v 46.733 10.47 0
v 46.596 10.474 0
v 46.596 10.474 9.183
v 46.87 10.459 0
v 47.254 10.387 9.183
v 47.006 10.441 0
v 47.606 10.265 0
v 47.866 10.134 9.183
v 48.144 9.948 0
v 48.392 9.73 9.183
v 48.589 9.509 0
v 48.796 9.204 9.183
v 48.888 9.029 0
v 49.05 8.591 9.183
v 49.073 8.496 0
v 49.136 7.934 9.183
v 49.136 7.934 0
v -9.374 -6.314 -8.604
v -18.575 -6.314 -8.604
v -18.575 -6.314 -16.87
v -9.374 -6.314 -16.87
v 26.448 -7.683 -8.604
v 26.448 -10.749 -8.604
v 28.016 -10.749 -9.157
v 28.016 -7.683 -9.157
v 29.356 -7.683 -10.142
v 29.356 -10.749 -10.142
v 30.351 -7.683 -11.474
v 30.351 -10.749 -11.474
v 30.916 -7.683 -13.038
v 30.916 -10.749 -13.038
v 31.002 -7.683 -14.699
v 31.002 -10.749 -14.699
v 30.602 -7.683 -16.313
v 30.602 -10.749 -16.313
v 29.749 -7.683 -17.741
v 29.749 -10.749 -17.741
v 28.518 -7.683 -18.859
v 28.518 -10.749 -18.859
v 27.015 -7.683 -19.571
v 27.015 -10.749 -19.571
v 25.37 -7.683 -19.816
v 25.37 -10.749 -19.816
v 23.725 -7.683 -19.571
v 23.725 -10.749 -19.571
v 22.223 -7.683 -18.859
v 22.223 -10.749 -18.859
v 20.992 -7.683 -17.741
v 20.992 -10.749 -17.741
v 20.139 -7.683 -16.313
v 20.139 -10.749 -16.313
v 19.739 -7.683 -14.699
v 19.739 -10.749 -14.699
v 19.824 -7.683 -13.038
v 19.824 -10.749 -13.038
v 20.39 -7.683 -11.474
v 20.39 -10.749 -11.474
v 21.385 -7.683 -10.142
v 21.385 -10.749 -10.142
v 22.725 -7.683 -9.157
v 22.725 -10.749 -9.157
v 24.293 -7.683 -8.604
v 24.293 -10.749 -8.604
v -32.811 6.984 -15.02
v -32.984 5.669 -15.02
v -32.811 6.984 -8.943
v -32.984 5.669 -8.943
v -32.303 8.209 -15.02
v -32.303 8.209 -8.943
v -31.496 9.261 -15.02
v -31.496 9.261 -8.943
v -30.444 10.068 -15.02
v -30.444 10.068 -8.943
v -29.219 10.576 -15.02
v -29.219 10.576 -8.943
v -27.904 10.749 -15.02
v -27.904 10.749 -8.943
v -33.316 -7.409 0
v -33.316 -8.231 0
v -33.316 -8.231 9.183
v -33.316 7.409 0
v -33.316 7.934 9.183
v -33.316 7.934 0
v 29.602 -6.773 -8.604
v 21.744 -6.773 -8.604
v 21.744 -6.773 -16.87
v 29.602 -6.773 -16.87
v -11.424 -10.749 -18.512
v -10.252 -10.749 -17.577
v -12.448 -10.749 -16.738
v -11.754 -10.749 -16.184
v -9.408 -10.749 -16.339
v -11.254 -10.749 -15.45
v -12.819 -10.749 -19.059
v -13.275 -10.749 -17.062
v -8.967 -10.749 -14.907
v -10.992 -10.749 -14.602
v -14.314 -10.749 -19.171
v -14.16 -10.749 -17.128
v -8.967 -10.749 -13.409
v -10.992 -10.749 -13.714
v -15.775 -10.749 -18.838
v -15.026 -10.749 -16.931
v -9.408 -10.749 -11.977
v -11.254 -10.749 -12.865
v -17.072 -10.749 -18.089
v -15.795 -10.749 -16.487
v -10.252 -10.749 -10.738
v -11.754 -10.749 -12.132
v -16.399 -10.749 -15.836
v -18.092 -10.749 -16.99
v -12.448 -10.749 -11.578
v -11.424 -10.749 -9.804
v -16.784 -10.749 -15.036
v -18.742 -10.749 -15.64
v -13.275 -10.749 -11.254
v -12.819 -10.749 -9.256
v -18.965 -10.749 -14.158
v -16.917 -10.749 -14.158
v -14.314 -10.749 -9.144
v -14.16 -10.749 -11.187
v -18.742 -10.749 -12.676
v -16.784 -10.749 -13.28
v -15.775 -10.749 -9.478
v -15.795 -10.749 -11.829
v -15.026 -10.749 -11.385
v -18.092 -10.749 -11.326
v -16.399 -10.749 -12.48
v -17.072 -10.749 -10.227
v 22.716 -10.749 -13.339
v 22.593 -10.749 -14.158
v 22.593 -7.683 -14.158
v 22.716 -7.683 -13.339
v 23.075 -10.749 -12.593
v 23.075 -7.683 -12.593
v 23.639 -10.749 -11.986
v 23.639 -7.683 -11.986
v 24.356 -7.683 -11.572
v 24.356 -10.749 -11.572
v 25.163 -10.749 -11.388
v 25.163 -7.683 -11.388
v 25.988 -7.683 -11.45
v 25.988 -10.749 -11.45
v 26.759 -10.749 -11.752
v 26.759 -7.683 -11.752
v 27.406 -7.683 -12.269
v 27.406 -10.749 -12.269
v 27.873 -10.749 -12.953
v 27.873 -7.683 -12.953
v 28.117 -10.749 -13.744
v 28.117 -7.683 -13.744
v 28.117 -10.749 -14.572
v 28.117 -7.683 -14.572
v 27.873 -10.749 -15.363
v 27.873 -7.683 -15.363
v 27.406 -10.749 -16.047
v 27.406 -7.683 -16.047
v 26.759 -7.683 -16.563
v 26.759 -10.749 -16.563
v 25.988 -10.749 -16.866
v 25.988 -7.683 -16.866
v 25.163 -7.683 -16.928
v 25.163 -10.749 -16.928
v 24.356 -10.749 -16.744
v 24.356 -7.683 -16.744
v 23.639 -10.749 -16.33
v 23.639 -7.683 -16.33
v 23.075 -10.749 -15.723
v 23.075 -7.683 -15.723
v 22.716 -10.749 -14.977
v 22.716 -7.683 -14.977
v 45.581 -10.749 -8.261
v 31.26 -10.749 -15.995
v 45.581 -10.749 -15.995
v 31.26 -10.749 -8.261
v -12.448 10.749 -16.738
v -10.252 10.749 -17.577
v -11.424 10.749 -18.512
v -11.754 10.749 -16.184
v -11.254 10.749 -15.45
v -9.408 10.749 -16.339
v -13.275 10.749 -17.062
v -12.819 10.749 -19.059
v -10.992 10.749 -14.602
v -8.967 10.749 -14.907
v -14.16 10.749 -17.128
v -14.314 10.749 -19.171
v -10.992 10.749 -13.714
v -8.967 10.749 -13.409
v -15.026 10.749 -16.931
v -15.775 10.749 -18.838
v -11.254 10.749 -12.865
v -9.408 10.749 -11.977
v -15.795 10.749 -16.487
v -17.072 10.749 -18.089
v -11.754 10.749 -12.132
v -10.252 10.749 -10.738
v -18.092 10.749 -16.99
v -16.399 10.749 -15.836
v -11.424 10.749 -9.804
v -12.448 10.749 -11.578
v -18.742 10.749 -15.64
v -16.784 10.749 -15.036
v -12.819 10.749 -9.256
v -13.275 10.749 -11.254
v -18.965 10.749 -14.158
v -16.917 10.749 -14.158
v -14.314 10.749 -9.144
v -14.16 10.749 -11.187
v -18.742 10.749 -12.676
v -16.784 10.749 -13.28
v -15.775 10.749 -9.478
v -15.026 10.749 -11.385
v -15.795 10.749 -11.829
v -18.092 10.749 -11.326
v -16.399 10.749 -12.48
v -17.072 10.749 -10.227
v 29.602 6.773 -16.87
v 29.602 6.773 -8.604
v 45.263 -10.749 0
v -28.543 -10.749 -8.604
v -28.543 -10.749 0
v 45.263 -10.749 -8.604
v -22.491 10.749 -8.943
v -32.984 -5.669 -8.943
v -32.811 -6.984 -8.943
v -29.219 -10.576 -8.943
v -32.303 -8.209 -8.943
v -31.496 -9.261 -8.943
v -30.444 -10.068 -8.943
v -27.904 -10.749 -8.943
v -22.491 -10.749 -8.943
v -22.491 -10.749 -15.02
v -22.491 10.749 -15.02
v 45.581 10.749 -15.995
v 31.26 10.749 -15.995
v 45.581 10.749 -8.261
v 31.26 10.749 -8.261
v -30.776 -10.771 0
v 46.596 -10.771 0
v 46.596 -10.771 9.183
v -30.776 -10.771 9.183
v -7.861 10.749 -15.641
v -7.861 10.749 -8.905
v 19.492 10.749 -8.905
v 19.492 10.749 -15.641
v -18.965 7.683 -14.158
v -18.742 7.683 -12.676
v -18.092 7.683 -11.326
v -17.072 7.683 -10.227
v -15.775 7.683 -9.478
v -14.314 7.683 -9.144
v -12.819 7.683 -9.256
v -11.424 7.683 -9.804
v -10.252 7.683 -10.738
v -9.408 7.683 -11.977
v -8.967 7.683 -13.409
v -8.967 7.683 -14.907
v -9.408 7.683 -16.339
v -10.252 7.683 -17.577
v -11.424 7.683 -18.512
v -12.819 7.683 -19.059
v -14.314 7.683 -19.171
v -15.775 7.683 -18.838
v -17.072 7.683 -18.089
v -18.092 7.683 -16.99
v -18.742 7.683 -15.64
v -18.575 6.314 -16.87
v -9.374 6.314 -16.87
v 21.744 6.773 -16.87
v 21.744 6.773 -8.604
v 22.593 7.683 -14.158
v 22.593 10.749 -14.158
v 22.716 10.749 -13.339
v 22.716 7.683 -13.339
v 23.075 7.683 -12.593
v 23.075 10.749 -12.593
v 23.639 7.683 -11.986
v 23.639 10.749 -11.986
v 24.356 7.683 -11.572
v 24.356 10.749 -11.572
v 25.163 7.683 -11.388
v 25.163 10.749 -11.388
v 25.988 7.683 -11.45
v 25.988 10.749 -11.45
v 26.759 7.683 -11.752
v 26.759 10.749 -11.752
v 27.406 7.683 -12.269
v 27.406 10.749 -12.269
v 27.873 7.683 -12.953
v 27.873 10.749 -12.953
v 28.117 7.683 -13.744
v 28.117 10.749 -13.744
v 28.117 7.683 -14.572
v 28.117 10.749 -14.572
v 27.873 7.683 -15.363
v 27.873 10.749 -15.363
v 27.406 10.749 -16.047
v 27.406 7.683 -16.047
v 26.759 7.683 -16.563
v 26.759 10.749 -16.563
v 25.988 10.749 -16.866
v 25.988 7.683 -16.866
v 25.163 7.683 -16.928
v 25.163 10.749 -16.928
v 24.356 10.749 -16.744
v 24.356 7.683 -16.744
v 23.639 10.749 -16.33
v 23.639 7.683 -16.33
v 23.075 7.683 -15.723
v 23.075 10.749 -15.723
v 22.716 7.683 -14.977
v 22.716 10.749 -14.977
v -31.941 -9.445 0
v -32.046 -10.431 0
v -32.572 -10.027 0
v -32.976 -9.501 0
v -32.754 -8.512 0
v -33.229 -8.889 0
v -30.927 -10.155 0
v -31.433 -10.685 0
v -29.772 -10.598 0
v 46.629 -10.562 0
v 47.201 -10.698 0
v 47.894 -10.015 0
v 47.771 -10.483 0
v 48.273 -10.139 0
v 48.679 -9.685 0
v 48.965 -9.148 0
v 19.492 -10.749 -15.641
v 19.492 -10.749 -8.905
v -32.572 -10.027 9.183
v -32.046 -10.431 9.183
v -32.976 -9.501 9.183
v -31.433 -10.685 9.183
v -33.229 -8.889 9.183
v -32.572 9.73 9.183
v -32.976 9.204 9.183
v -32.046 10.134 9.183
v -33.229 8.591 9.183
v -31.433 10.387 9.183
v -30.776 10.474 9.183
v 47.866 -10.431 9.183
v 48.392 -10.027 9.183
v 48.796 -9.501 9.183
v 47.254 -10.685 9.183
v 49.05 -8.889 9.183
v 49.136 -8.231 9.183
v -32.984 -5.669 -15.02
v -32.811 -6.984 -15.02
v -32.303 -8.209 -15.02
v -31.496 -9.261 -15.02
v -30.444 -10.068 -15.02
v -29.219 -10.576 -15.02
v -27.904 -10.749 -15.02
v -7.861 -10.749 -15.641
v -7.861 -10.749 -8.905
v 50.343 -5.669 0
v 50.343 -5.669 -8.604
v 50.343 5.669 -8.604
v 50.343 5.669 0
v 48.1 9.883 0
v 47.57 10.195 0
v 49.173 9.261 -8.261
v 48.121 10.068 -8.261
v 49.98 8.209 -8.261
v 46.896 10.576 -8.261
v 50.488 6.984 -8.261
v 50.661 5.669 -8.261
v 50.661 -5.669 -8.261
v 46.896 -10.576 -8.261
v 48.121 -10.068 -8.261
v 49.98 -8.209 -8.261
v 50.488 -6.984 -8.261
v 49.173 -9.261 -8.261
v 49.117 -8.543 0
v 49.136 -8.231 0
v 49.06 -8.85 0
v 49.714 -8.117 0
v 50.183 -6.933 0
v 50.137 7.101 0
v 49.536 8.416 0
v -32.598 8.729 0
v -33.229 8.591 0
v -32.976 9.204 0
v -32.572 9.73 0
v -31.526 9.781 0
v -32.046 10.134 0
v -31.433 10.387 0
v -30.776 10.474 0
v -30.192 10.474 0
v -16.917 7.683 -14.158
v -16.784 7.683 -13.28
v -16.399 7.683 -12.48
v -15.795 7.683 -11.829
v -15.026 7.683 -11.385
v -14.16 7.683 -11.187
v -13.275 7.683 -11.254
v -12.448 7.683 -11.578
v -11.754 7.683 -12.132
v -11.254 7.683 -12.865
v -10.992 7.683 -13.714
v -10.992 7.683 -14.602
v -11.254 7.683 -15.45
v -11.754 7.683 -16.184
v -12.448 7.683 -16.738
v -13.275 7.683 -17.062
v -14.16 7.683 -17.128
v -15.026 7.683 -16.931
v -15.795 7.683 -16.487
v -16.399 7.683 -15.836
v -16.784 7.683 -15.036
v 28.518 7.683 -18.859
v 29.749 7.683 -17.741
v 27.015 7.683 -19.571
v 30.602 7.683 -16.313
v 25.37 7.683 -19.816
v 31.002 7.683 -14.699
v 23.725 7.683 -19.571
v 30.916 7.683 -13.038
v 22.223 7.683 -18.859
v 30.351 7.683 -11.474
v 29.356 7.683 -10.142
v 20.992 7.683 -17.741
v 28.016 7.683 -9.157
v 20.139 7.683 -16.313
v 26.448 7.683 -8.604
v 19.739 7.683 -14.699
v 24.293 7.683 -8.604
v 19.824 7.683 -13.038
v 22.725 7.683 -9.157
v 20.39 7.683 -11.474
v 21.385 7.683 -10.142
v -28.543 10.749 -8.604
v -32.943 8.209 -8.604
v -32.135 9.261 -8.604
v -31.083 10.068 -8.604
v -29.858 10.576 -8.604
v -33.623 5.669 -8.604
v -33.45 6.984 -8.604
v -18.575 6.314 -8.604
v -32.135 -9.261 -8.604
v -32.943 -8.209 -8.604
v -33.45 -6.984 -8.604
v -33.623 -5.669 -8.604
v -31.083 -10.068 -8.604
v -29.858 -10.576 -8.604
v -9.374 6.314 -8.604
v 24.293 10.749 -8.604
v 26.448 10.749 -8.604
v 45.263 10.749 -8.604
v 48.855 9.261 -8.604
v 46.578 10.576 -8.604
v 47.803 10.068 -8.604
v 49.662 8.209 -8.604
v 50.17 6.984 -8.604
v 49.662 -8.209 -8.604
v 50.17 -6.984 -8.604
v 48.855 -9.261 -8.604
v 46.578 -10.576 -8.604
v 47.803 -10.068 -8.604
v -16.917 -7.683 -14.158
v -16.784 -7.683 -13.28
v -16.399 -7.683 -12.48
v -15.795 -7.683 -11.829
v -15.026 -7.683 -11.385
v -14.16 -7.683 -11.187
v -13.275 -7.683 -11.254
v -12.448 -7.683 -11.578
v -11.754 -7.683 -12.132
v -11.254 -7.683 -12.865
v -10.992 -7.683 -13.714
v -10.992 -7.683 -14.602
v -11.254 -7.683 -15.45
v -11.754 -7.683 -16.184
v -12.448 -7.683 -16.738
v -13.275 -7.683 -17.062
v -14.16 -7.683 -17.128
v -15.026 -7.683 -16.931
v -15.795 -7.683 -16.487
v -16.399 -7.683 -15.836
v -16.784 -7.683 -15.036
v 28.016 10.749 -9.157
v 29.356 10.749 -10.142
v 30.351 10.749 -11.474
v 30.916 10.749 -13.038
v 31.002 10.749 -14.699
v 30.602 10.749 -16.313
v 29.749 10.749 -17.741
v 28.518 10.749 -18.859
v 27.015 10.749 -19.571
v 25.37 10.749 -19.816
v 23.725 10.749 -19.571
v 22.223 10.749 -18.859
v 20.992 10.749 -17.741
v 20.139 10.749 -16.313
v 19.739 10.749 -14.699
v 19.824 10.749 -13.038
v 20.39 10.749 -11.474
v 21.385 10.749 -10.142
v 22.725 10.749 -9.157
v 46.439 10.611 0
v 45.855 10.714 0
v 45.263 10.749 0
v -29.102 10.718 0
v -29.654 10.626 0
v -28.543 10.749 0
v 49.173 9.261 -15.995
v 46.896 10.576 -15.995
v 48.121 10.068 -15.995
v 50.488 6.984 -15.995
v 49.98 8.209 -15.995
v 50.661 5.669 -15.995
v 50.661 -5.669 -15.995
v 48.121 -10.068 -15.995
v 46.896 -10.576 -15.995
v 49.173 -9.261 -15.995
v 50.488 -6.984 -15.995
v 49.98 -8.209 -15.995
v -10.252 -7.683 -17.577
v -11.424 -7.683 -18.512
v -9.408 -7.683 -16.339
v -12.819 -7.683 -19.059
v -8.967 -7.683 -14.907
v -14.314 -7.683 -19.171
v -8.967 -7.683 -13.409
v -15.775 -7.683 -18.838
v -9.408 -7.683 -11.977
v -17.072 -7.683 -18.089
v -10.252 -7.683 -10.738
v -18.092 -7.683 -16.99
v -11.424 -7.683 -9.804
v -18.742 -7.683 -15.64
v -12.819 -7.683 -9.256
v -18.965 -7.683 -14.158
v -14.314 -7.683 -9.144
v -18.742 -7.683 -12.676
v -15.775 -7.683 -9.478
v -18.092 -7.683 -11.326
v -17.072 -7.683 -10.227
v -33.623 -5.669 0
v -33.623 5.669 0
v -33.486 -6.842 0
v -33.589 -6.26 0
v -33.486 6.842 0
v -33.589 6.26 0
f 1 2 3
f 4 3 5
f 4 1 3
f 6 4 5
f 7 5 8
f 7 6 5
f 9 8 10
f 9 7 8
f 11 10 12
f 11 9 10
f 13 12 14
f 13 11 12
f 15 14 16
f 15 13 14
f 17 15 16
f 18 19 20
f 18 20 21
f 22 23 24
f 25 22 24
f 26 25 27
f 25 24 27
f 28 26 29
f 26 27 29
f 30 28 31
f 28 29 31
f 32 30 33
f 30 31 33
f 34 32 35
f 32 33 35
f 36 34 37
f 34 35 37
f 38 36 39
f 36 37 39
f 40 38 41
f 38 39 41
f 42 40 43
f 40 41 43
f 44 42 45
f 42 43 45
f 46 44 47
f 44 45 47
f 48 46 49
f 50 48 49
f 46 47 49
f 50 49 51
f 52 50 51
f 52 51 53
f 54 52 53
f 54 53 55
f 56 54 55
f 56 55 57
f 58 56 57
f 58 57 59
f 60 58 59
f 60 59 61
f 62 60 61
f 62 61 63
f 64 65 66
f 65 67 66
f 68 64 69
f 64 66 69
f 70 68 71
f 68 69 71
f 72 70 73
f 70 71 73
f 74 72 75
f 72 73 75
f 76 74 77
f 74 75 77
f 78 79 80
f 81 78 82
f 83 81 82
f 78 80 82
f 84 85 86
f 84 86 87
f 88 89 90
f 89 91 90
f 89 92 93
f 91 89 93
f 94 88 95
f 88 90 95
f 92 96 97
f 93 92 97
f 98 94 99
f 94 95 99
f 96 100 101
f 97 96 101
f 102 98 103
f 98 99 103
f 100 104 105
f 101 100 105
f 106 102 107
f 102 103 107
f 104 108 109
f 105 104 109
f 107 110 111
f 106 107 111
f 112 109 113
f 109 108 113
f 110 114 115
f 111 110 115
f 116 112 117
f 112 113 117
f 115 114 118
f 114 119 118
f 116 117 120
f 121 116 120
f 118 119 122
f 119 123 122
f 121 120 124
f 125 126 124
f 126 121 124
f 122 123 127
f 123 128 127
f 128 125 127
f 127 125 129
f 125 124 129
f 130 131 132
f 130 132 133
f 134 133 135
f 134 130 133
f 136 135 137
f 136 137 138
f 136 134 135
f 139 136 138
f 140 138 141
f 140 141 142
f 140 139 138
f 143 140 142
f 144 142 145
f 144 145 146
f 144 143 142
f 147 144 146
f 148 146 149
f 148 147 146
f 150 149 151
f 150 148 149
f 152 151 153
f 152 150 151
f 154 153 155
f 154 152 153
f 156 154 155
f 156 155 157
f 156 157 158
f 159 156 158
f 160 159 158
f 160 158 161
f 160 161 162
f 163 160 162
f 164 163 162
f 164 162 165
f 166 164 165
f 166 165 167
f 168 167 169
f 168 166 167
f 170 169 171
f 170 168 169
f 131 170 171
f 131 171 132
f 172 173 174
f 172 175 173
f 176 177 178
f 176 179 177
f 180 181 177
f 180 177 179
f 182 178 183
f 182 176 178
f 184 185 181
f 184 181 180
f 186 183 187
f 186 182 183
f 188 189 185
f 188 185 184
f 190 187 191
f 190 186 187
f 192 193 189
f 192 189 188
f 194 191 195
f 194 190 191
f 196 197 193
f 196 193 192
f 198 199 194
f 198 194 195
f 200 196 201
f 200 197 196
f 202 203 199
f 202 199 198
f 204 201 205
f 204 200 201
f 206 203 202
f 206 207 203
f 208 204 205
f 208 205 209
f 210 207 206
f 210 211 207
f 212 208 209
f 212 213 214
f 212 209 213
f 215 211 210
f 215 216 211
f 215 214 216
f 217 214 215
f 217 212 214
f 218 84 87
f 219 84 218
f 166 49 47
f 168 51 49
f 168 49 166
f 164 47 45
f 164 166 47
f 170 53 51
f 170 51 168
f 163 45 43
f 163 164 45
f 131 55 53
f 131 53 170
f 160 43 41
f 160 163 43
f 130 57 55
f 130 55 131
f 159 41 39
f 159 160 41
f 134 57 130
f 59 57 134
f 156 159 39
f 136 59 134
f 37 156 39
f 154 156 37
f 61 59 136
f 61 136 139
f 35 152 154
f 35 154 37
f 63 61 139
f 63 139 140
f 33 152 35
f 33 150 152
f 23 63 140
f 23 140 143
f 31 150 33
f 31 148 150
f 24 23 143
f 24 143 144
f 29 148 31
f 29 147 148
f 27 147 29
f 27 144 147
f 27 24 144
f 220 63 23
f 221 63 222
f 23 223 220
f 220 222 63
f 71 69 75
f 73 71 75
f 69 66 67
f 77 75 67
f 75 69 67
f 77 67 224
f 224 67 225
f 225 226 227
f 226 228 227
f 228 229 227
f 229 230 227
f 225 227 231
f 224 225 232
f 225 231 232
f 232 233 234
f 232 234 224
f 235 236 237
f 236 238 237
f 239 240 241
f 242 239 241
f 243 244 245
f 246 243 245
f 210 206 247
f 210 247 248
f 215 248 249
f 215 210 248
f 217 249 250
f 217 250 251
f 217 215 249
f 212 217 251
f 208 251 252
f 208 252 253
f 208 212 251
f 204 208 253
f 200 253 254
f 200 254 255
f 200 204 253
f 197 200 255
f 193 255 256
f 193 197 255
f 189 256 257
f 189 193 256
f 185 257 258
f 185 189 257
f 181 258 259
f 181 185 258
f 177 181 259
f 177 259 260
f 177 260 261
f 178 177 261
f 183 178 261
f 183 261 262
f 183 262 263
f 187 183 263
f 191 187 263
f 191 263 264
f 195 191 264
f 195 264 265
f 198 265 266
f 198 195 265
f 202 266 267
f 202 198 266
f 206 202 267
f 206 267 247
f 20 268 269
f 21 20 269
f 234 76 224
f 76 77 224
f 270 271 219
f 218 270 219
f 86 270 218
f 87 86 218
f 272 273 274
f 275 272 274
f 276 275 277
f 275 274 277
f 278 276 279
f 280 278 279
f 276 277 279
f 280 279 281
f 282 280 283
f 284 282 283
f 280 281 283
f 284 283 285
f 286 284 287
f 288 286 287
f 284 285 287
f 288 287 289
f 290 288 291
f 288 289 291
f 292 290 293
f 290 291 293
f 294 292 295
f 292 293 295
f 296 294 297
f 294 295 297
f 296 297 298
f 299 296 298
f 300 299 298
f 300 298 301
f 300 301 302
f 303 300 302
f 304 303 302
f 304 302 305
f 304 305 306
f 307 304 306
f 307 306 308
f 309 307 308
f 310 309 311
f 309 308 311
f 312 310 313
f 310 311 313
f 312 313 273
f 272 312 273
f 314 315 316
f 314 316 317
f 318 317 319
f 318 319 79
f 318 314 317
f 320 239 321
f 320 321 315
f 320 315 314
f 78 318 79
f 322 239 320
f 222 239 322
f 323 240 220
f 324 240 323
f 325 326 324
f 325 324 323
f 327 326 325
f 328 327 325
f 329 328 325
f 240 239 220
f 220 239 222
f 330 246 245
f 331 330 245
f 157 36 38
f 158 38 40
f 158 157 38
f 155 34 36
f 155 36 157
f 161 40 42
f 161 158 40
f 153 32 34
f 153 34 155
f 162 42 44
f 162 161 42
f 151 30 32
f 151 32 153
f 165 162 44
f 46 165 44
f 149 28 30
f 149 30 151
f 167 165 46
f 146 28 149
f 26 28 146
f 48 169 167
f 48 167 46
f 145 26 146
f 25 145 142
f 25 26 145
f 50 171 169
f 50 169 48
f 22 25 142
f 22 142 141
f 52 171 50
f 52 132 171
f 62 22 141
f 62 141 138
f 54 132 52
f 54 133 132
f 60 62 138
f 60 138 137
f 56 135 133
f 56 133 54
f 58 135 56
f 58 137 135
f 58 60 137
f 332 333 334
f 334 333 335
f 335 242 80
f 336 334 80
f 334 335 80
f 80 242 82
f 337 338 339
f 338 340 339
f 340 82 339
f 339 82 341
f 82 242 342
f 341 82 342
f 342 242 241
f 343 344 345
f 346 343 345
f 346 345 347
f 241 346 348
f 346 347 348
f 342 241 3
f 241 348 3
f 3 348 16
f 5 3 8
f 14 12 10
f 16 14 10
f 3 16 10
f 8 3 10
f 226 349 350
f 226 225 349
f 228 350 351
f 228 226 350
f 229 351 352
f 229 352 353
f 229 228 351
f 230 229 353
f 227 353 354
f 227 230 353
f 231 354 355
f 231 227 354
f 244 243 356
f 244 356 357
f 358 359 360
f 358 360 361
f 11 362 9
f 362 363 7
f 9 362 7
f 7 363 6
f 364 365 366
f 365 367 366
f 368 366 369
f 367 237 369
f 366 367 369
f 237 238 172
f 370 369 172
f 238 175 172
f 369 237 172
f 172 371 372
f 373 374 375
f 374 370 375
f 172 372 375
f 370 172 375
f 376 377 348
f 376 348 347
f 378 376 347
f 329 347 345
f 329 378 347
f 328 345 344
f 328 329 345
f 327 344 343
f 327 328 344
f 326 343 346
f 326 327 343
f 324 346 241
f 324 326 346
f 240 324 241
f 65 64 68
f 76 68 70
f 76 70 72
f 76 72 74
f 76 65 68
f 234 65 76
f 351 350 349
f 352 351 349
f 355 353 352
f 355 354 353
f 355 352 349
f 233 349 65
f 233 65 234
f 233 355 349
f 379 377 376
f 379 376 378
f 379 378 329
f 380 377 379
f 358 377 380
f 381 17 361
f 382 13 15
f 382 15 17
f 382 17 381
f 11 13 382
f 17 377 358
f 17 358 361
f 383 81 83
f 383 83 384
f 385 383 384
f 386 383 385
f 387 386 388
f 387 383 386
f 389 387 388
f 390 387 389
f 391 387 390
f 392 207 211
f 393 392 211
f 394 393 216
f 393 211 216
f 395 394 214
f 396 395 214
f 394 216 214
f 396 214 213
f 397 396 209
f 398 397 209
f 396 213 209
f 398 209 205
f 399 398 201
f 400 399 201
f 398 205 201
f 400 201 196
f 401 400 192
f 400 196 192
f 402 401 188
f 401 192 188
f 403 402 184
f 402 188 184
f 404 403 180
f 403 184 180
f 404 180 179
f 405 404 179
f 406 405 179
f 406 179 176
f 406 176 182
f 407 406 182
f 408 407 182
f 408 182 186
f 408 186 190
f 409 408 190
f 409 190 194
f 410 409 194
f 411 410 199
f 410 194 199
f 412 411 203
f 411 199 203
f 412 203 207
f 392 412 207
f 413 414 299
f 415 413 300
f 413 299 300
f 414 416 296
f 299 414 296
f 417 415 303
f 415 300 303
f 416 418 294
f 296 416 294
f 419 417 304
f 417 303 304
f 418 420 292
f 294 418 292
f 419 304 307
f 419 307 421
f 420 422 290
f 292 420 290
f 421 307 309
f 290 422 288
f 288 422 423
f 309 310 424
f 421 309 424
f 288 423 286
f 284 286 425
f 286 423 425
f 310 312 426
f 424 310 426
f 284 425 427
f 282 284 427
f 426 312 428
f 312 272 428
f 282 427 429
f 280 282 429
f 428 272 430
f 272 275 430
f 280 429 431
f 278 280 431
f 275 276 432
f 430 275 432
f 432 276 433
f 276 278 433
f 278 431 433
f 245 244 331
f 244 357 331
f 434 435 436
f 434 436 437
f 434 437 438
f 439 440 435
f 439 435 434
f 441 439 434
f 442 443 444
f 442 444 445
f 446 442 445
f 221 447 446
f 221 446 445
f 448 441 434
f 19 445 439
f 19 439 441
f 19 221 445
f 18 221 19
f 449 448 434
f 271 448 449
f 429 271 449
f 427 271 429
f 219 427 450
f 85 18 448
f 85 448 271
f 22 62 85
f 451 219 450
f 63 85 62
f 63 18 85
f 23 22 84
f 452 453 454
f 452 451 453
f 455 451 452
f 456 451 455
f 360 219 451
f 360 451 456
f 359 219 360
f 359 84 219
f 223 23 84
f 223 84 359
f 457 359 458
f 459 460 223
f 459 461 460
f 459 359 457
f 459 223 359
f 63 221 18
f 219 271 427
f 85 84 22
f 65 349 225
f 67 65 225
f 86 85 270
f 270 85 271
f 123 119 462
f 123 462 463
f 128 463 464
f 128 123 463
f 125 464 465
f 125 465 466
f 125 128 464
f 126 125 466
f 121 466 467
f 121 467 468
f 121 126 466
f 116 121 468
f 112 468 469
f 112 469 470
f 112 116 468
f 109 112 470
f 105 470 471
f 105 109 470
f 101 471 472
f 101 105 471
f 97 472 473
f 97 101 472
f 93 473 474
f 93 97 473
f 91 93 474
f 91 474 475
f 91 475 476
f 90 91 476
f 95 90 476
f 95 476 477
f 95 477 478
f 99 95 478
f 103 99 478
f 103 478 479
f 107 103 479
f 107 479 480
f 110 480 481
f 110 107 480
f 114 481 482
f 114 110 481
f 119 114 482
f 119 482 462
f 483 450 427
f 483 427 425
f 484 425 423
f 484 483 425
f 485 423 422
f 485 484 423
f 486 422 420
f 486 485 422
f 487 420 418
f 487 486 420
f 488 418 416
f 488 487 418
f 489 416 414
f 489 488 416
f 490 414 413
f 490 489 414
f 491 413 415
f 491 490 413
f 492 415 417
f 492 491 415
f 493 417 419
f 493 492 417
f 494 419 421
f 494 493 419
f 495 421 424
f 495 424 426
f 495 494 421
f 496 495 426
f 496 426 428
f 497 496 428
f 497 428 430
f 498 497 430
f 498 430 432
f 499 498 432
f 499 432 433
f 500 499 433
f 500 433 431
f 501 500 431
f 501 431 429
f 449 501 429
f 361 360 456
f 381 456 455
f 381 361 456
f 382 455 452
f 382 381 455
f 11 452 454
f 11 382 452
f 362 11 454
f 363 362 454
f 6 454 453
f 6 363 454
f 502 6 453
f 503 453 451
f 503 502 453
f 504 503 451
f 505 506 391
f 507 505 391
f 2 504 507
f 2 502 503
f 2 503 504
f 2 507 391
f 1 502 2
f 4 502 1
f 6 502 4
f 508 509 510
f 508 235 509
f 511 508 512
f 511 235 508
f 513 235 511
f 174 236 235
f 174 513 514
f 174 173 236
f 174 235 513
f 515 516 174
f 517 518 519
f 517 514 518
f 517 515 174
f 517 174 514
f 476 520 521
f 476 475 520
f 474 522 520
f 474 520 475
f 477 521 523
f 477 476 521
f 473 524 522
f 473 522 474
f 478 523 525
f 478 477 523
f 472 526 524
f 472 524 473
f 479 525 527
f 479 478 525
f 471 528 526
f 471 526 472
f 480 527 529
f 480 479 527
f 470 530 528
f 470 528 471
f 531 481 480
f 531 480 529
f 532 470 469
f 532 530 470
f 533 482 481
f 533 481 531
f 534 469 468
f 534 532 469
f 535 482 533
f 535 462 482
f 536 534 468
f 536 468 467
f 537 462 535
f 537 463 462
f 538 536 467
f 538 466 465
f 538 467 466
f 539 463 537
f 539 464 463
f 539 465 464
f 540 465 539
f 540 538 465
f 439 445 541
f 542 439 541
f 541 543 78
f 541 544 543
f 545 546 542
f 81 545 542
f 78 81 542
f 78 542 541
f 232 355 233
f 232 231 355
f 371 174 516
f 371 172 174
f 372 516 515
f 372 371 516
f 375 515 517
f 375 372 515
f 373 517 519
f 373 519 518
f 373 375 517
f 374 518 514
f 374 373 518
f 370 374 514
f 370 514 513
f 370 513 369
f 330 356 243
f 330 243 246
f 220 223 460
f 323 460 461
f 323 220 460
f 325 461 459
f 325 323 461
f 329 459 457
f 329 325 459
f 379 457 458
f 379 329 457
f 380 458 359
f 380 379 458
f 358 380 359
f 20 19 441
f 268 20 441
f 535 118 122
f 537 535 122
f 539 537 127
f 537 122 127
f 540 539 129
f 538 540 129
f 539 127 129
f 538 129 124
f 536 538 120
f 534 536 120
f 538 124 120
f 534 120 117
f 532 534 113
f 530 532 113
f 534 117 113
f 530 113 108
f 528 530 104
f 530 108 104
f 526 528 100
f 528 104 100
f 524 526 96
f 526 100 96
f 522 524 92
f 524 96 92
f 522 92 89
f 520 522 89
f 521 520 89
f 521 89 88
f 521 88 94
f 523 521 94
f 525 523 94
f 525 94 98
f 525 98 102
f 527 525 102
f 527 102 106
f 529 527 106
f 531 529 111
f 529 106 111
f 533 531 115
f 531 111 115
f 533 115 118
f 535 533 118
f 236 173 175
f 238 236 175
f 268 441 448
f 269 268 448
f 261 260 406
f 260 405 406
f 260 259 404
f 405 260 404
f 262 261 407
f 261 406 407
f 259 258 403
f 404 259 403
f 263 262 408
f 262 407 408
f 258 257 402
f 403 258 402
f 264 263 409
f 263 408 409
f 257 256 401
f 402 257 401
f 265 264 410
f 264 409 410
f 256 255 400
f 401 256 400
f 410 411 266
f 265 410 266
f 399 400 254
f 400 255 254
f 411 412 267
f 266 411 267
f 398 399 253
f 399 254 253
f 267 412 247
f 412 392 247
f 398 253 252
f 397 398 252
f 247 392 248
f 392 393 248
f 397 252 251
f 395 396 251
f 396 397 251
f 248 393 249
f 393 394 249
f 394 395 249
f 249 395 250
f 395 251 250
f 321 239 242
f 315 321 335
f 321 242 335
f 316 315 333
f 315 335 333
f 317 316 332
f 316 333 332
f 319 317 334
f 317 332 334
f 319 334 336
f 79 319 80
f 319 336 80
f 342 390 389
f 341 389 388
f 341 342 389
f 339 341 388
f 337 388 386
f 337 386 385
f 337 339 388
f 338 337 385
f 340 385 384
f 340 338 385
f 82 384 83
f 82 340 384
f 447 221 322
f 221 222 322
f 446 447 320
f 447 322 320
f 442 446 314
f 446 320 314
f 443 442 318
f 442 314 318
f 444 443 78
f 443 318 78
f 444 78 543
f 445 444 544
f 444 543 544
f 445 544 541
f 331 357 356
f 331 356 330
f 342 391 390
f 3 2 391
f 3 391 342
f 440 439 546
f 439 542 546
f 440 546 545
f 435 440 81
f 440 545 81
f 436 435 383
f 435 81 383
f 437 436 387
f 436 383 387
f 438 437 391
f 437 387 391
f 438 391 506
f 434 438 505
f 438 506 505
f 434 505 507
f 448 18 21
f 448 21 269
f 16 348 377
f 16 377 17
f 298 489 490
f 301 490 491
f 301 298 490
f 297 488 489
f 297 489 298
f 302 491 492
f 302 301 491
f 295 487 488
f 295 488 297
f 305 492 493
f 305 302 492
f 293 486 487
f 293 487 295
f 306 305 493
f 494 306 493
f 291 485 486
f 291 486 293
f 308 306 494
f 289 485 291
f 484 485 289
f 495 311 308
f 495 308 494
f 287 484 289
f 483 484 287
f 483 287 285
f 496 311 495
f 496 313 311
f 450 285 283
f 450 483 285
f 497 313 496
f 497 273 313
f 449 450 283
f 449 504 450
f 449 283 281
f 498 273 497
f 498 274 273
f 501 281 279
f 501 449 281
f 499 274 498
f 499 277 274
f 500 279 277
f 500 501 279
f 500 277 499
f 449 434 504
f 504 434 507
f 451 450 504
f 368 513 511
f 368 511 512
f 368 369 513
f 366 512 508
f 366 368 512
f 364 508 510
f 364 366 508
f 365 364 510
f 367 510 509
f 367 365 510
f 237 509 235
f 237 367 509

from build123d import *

# Parameters (mm, degrees)
F0_W         = 83.9661955833
F0_H         = 8.6036846042
F2_DEPTH     = 10.7490709051
F1_W         = 27.3526310921
F1_H         = 6.7362785339
F1_W_2       = 19.4012820721
F1_H_2       = 7.7336356044
F1_W_3       = 10.4926526546
F1_H_3       = 6.0765519738
F4_R         = 5.08
F5_R         = 5.08
F3_R         = 5.6577404846
F3_R_2       = 2.7776319259
F6_DEPTH     = 3.0659101903
F3_R_3       = 5.0275038218
F3_R_4       = 2.978926648
F7_R         = 5.08
F8_R         = 5.08
F10_W        = 9.2010200024
F10_H        = 12.6288309693
F10_W_2      = 7.8585743904
F10_H_2      = 13.5450959206
F11_DEPTH    = 16.8703179806
F20_W        = 21.2450809777
F20_H        = 9.1825369745
F21_DEPTH    = 49.1361897439
F22_T1_DEPTH = 15.5325369745
F23_DEPTH    = 33.3159770817
F24_R        = 2.54


# Not quite as in the source:
# - a fillet or chamfer that OpenCascade refuses, or shapes differently, is made with other operations: its cross-section is extruded or revolved along the edge and cut away or added
# - a feature names something its author has since deleted; it is built from what else it names
# - the program builds the solid bodies; features that only make, move or delete a surface that nothing else refers to are left out


with BuildPart() as f2:
    # F0 (on Front) → F2 (new body, symmetric)
    with BuildSketch(Plane.XZ):
        with Locations((8.359849453, -4.3018423021)):
            Rectangle(F0_W, F0_H)
    extrude(amount=F2_DEPTH, both=True)

    # F4
    f4_edges = [f2.edges().sort_by_distance(p)[0] for p in [
        (50.342947, 10.749071, -4.301842),
        (50.342947, -10.749071, -4.301842),
    ]]
    fillet(f4_edges, radius=F4_R)

    # F3 (on face) → F6 (join)
    with BuildSketch(Plane(origin=(0, 10.7490709051, 0), x_dir=(-1, 0, 0), z_dir=(0, 1, 0))):
        with Locations((-25.3703502001, -14.1578875482)):
            Circle(F3_R)
        with Locations((-25.3703502001, -14.1578875482)):
            Circle(F3_R_2, mode=Mode.SUBTRACT)
    extrude(amount=-F6_DEPTH)

    # F7
    f7_edges = [f2.edges().sort_by_distance(p)[0] for p in [
        (-33.623248, -10.749071, -4.301842),
        (-33.623248, 10.749071, -4.301842),
    ]]
    fillet(f7_edges, radius=F7_R)

    # F9: F2, F6 across plane


with BuildPart() as f2b:
    # F1 (on Front) → F2, piece 2 (new body, symmetric)
    with BuildSketch(Plane.XZ):
        with Locations((5.8154165745, -12.272760272)):
            Rectangle(F1_W, F1_H)
    extrude(amount=F2_DEPTH, both=True)


with BuildPart() as f2c:
    # F1 (on Front) → F2, piece 3 (new body, symmetric)
    with BuildSketch(Plane.XZ):
        with Locations((40.9603565931, -12.1280737221)):
            Rectangle(F1_W_2, F1_H_2)
    extrude(amount=F2_DEPTH, both=True)

    # F5
    f5_edges = [f2c.edges().sort_by_distance(p)[0] for p in [
        (50.660998, 10.749071, -12.128074),
        (50.660998, -10.749071, -12.128074),
    ]]
    fillet(f5_edges, radius=F5_R)


with BuildPart() as f2d:
    # F1 (on Front) → F2, piece 4 (new body, symmetric)
    with BuildSketch(Plane.XZ):
        with Locations((-27.7377068996, -11.981267482)):
            Rectangle(F1_W_3, F1_H_3)
    extrude(amount=F2_DEPTH, both=True)

    # F8
    f8_edges = [f2d.edges().sort_by_distance(p)[0] for p in [
        (-32.984033, 10.749071, -11.981267),
        (-32.984033, -10.749071, -11.981267),
    ]]
    fillet(f8_edges, radius=F8_R)


with BuildPart() as f6:
    # F3 (on face) → F6, piece 2 (new body)
    with BuildSketch(Plane(origin=(0, 10.7490709051, 0), x_dir=(-1, 0, 0), z_dir=(0, 1, 0))):
        with Locations((13.9378588647, -14.1578875482)):
            Circle(F3_R_3)
        with Locations((13.9378588647, -14.1578875482)):
            Circle(F3_R_4, mode=Mode.SUBTRACT)
    extrude(amount=-F6_DEPTH)


with BuildPart() as f2_1:
    add(f2.part)
    add(f2.part.mirror(Plane.XZ))
    add(f6.part.mirror(Plane.XZ))

    # F10 (on Top) → F11 (join)
    with BuildSketch(Plane.XY):
        with Locations((-13.9741003513, 0)):
            Rectangle(F10_W, F10_H)
        with Locations((25.6728827953, 0)):
            Rectangle(F10_W_2, F10_H_2)
    extrude(amount=-F11_DEPTH)

    # F20 (on Right) → F21 (join)
    with BuildSketch(Plane.YZ):
        with Locations((-0.1486409456, 4.5912684873)):
            Rectangle(F20_W, F20_H)
    extrude(amount=F21_DEPTH)

    # F22: fillet of radius 2.54 on 2 edges, made by hand

    # F22_s2 → F22_t1 (cut)
    with BuildSketch(Plane.XY):
        with BuildLine():
            ThreePointArc((49.1361897439, -8.2311814344), (48.3922409681, -10.0272326586), (46.5961897439, -10.7711814344))
            Line((46.5961897439, -10.7711814344), (49.1361897439, -10.7711814344))
            Line((49.1361897439, -10.7711814344), (49.1361897439, -8.2311814344))
        make_face()
        with BuildLine():
            ThreePointArc((46.5961897439, 10.4738995433), (48.3922409681, 9.7299507675), (49.1361897439, 7.9338995433))
            Line((49.1361897439, 7.9338995433), (49.1361897439, 10.4738995433))
            Line((49.1361897439, 10.4738995433), (46.5961897439, 10.4738995433))
        make_face()
    extrude(amount=F22_T1_DEPTH, mode=Mode.SUBTRACT)

    # F23 (add): a face of the model
    f23_faces = [f2_1.faces().sort_by_distance(p)[0] for p in [
        (0, -0.1486409456, 4.5912684873),
    ]]
    extrude(f23_faces, amount=F23_DEPTH)

    # F24
    f24_edges = [f2_1.edges().sort_by_distance(p)[0] for p in [
        (-33.315977, 10.4739, 4.591268),
        (-33.315977, -10.771181, 4.591268),
    ]]
    fillet(f24_edges, radius=F24_R)


solid = Compound([f2b.part, f2c.part, f2d.part, f6.part, f2_1.part])
